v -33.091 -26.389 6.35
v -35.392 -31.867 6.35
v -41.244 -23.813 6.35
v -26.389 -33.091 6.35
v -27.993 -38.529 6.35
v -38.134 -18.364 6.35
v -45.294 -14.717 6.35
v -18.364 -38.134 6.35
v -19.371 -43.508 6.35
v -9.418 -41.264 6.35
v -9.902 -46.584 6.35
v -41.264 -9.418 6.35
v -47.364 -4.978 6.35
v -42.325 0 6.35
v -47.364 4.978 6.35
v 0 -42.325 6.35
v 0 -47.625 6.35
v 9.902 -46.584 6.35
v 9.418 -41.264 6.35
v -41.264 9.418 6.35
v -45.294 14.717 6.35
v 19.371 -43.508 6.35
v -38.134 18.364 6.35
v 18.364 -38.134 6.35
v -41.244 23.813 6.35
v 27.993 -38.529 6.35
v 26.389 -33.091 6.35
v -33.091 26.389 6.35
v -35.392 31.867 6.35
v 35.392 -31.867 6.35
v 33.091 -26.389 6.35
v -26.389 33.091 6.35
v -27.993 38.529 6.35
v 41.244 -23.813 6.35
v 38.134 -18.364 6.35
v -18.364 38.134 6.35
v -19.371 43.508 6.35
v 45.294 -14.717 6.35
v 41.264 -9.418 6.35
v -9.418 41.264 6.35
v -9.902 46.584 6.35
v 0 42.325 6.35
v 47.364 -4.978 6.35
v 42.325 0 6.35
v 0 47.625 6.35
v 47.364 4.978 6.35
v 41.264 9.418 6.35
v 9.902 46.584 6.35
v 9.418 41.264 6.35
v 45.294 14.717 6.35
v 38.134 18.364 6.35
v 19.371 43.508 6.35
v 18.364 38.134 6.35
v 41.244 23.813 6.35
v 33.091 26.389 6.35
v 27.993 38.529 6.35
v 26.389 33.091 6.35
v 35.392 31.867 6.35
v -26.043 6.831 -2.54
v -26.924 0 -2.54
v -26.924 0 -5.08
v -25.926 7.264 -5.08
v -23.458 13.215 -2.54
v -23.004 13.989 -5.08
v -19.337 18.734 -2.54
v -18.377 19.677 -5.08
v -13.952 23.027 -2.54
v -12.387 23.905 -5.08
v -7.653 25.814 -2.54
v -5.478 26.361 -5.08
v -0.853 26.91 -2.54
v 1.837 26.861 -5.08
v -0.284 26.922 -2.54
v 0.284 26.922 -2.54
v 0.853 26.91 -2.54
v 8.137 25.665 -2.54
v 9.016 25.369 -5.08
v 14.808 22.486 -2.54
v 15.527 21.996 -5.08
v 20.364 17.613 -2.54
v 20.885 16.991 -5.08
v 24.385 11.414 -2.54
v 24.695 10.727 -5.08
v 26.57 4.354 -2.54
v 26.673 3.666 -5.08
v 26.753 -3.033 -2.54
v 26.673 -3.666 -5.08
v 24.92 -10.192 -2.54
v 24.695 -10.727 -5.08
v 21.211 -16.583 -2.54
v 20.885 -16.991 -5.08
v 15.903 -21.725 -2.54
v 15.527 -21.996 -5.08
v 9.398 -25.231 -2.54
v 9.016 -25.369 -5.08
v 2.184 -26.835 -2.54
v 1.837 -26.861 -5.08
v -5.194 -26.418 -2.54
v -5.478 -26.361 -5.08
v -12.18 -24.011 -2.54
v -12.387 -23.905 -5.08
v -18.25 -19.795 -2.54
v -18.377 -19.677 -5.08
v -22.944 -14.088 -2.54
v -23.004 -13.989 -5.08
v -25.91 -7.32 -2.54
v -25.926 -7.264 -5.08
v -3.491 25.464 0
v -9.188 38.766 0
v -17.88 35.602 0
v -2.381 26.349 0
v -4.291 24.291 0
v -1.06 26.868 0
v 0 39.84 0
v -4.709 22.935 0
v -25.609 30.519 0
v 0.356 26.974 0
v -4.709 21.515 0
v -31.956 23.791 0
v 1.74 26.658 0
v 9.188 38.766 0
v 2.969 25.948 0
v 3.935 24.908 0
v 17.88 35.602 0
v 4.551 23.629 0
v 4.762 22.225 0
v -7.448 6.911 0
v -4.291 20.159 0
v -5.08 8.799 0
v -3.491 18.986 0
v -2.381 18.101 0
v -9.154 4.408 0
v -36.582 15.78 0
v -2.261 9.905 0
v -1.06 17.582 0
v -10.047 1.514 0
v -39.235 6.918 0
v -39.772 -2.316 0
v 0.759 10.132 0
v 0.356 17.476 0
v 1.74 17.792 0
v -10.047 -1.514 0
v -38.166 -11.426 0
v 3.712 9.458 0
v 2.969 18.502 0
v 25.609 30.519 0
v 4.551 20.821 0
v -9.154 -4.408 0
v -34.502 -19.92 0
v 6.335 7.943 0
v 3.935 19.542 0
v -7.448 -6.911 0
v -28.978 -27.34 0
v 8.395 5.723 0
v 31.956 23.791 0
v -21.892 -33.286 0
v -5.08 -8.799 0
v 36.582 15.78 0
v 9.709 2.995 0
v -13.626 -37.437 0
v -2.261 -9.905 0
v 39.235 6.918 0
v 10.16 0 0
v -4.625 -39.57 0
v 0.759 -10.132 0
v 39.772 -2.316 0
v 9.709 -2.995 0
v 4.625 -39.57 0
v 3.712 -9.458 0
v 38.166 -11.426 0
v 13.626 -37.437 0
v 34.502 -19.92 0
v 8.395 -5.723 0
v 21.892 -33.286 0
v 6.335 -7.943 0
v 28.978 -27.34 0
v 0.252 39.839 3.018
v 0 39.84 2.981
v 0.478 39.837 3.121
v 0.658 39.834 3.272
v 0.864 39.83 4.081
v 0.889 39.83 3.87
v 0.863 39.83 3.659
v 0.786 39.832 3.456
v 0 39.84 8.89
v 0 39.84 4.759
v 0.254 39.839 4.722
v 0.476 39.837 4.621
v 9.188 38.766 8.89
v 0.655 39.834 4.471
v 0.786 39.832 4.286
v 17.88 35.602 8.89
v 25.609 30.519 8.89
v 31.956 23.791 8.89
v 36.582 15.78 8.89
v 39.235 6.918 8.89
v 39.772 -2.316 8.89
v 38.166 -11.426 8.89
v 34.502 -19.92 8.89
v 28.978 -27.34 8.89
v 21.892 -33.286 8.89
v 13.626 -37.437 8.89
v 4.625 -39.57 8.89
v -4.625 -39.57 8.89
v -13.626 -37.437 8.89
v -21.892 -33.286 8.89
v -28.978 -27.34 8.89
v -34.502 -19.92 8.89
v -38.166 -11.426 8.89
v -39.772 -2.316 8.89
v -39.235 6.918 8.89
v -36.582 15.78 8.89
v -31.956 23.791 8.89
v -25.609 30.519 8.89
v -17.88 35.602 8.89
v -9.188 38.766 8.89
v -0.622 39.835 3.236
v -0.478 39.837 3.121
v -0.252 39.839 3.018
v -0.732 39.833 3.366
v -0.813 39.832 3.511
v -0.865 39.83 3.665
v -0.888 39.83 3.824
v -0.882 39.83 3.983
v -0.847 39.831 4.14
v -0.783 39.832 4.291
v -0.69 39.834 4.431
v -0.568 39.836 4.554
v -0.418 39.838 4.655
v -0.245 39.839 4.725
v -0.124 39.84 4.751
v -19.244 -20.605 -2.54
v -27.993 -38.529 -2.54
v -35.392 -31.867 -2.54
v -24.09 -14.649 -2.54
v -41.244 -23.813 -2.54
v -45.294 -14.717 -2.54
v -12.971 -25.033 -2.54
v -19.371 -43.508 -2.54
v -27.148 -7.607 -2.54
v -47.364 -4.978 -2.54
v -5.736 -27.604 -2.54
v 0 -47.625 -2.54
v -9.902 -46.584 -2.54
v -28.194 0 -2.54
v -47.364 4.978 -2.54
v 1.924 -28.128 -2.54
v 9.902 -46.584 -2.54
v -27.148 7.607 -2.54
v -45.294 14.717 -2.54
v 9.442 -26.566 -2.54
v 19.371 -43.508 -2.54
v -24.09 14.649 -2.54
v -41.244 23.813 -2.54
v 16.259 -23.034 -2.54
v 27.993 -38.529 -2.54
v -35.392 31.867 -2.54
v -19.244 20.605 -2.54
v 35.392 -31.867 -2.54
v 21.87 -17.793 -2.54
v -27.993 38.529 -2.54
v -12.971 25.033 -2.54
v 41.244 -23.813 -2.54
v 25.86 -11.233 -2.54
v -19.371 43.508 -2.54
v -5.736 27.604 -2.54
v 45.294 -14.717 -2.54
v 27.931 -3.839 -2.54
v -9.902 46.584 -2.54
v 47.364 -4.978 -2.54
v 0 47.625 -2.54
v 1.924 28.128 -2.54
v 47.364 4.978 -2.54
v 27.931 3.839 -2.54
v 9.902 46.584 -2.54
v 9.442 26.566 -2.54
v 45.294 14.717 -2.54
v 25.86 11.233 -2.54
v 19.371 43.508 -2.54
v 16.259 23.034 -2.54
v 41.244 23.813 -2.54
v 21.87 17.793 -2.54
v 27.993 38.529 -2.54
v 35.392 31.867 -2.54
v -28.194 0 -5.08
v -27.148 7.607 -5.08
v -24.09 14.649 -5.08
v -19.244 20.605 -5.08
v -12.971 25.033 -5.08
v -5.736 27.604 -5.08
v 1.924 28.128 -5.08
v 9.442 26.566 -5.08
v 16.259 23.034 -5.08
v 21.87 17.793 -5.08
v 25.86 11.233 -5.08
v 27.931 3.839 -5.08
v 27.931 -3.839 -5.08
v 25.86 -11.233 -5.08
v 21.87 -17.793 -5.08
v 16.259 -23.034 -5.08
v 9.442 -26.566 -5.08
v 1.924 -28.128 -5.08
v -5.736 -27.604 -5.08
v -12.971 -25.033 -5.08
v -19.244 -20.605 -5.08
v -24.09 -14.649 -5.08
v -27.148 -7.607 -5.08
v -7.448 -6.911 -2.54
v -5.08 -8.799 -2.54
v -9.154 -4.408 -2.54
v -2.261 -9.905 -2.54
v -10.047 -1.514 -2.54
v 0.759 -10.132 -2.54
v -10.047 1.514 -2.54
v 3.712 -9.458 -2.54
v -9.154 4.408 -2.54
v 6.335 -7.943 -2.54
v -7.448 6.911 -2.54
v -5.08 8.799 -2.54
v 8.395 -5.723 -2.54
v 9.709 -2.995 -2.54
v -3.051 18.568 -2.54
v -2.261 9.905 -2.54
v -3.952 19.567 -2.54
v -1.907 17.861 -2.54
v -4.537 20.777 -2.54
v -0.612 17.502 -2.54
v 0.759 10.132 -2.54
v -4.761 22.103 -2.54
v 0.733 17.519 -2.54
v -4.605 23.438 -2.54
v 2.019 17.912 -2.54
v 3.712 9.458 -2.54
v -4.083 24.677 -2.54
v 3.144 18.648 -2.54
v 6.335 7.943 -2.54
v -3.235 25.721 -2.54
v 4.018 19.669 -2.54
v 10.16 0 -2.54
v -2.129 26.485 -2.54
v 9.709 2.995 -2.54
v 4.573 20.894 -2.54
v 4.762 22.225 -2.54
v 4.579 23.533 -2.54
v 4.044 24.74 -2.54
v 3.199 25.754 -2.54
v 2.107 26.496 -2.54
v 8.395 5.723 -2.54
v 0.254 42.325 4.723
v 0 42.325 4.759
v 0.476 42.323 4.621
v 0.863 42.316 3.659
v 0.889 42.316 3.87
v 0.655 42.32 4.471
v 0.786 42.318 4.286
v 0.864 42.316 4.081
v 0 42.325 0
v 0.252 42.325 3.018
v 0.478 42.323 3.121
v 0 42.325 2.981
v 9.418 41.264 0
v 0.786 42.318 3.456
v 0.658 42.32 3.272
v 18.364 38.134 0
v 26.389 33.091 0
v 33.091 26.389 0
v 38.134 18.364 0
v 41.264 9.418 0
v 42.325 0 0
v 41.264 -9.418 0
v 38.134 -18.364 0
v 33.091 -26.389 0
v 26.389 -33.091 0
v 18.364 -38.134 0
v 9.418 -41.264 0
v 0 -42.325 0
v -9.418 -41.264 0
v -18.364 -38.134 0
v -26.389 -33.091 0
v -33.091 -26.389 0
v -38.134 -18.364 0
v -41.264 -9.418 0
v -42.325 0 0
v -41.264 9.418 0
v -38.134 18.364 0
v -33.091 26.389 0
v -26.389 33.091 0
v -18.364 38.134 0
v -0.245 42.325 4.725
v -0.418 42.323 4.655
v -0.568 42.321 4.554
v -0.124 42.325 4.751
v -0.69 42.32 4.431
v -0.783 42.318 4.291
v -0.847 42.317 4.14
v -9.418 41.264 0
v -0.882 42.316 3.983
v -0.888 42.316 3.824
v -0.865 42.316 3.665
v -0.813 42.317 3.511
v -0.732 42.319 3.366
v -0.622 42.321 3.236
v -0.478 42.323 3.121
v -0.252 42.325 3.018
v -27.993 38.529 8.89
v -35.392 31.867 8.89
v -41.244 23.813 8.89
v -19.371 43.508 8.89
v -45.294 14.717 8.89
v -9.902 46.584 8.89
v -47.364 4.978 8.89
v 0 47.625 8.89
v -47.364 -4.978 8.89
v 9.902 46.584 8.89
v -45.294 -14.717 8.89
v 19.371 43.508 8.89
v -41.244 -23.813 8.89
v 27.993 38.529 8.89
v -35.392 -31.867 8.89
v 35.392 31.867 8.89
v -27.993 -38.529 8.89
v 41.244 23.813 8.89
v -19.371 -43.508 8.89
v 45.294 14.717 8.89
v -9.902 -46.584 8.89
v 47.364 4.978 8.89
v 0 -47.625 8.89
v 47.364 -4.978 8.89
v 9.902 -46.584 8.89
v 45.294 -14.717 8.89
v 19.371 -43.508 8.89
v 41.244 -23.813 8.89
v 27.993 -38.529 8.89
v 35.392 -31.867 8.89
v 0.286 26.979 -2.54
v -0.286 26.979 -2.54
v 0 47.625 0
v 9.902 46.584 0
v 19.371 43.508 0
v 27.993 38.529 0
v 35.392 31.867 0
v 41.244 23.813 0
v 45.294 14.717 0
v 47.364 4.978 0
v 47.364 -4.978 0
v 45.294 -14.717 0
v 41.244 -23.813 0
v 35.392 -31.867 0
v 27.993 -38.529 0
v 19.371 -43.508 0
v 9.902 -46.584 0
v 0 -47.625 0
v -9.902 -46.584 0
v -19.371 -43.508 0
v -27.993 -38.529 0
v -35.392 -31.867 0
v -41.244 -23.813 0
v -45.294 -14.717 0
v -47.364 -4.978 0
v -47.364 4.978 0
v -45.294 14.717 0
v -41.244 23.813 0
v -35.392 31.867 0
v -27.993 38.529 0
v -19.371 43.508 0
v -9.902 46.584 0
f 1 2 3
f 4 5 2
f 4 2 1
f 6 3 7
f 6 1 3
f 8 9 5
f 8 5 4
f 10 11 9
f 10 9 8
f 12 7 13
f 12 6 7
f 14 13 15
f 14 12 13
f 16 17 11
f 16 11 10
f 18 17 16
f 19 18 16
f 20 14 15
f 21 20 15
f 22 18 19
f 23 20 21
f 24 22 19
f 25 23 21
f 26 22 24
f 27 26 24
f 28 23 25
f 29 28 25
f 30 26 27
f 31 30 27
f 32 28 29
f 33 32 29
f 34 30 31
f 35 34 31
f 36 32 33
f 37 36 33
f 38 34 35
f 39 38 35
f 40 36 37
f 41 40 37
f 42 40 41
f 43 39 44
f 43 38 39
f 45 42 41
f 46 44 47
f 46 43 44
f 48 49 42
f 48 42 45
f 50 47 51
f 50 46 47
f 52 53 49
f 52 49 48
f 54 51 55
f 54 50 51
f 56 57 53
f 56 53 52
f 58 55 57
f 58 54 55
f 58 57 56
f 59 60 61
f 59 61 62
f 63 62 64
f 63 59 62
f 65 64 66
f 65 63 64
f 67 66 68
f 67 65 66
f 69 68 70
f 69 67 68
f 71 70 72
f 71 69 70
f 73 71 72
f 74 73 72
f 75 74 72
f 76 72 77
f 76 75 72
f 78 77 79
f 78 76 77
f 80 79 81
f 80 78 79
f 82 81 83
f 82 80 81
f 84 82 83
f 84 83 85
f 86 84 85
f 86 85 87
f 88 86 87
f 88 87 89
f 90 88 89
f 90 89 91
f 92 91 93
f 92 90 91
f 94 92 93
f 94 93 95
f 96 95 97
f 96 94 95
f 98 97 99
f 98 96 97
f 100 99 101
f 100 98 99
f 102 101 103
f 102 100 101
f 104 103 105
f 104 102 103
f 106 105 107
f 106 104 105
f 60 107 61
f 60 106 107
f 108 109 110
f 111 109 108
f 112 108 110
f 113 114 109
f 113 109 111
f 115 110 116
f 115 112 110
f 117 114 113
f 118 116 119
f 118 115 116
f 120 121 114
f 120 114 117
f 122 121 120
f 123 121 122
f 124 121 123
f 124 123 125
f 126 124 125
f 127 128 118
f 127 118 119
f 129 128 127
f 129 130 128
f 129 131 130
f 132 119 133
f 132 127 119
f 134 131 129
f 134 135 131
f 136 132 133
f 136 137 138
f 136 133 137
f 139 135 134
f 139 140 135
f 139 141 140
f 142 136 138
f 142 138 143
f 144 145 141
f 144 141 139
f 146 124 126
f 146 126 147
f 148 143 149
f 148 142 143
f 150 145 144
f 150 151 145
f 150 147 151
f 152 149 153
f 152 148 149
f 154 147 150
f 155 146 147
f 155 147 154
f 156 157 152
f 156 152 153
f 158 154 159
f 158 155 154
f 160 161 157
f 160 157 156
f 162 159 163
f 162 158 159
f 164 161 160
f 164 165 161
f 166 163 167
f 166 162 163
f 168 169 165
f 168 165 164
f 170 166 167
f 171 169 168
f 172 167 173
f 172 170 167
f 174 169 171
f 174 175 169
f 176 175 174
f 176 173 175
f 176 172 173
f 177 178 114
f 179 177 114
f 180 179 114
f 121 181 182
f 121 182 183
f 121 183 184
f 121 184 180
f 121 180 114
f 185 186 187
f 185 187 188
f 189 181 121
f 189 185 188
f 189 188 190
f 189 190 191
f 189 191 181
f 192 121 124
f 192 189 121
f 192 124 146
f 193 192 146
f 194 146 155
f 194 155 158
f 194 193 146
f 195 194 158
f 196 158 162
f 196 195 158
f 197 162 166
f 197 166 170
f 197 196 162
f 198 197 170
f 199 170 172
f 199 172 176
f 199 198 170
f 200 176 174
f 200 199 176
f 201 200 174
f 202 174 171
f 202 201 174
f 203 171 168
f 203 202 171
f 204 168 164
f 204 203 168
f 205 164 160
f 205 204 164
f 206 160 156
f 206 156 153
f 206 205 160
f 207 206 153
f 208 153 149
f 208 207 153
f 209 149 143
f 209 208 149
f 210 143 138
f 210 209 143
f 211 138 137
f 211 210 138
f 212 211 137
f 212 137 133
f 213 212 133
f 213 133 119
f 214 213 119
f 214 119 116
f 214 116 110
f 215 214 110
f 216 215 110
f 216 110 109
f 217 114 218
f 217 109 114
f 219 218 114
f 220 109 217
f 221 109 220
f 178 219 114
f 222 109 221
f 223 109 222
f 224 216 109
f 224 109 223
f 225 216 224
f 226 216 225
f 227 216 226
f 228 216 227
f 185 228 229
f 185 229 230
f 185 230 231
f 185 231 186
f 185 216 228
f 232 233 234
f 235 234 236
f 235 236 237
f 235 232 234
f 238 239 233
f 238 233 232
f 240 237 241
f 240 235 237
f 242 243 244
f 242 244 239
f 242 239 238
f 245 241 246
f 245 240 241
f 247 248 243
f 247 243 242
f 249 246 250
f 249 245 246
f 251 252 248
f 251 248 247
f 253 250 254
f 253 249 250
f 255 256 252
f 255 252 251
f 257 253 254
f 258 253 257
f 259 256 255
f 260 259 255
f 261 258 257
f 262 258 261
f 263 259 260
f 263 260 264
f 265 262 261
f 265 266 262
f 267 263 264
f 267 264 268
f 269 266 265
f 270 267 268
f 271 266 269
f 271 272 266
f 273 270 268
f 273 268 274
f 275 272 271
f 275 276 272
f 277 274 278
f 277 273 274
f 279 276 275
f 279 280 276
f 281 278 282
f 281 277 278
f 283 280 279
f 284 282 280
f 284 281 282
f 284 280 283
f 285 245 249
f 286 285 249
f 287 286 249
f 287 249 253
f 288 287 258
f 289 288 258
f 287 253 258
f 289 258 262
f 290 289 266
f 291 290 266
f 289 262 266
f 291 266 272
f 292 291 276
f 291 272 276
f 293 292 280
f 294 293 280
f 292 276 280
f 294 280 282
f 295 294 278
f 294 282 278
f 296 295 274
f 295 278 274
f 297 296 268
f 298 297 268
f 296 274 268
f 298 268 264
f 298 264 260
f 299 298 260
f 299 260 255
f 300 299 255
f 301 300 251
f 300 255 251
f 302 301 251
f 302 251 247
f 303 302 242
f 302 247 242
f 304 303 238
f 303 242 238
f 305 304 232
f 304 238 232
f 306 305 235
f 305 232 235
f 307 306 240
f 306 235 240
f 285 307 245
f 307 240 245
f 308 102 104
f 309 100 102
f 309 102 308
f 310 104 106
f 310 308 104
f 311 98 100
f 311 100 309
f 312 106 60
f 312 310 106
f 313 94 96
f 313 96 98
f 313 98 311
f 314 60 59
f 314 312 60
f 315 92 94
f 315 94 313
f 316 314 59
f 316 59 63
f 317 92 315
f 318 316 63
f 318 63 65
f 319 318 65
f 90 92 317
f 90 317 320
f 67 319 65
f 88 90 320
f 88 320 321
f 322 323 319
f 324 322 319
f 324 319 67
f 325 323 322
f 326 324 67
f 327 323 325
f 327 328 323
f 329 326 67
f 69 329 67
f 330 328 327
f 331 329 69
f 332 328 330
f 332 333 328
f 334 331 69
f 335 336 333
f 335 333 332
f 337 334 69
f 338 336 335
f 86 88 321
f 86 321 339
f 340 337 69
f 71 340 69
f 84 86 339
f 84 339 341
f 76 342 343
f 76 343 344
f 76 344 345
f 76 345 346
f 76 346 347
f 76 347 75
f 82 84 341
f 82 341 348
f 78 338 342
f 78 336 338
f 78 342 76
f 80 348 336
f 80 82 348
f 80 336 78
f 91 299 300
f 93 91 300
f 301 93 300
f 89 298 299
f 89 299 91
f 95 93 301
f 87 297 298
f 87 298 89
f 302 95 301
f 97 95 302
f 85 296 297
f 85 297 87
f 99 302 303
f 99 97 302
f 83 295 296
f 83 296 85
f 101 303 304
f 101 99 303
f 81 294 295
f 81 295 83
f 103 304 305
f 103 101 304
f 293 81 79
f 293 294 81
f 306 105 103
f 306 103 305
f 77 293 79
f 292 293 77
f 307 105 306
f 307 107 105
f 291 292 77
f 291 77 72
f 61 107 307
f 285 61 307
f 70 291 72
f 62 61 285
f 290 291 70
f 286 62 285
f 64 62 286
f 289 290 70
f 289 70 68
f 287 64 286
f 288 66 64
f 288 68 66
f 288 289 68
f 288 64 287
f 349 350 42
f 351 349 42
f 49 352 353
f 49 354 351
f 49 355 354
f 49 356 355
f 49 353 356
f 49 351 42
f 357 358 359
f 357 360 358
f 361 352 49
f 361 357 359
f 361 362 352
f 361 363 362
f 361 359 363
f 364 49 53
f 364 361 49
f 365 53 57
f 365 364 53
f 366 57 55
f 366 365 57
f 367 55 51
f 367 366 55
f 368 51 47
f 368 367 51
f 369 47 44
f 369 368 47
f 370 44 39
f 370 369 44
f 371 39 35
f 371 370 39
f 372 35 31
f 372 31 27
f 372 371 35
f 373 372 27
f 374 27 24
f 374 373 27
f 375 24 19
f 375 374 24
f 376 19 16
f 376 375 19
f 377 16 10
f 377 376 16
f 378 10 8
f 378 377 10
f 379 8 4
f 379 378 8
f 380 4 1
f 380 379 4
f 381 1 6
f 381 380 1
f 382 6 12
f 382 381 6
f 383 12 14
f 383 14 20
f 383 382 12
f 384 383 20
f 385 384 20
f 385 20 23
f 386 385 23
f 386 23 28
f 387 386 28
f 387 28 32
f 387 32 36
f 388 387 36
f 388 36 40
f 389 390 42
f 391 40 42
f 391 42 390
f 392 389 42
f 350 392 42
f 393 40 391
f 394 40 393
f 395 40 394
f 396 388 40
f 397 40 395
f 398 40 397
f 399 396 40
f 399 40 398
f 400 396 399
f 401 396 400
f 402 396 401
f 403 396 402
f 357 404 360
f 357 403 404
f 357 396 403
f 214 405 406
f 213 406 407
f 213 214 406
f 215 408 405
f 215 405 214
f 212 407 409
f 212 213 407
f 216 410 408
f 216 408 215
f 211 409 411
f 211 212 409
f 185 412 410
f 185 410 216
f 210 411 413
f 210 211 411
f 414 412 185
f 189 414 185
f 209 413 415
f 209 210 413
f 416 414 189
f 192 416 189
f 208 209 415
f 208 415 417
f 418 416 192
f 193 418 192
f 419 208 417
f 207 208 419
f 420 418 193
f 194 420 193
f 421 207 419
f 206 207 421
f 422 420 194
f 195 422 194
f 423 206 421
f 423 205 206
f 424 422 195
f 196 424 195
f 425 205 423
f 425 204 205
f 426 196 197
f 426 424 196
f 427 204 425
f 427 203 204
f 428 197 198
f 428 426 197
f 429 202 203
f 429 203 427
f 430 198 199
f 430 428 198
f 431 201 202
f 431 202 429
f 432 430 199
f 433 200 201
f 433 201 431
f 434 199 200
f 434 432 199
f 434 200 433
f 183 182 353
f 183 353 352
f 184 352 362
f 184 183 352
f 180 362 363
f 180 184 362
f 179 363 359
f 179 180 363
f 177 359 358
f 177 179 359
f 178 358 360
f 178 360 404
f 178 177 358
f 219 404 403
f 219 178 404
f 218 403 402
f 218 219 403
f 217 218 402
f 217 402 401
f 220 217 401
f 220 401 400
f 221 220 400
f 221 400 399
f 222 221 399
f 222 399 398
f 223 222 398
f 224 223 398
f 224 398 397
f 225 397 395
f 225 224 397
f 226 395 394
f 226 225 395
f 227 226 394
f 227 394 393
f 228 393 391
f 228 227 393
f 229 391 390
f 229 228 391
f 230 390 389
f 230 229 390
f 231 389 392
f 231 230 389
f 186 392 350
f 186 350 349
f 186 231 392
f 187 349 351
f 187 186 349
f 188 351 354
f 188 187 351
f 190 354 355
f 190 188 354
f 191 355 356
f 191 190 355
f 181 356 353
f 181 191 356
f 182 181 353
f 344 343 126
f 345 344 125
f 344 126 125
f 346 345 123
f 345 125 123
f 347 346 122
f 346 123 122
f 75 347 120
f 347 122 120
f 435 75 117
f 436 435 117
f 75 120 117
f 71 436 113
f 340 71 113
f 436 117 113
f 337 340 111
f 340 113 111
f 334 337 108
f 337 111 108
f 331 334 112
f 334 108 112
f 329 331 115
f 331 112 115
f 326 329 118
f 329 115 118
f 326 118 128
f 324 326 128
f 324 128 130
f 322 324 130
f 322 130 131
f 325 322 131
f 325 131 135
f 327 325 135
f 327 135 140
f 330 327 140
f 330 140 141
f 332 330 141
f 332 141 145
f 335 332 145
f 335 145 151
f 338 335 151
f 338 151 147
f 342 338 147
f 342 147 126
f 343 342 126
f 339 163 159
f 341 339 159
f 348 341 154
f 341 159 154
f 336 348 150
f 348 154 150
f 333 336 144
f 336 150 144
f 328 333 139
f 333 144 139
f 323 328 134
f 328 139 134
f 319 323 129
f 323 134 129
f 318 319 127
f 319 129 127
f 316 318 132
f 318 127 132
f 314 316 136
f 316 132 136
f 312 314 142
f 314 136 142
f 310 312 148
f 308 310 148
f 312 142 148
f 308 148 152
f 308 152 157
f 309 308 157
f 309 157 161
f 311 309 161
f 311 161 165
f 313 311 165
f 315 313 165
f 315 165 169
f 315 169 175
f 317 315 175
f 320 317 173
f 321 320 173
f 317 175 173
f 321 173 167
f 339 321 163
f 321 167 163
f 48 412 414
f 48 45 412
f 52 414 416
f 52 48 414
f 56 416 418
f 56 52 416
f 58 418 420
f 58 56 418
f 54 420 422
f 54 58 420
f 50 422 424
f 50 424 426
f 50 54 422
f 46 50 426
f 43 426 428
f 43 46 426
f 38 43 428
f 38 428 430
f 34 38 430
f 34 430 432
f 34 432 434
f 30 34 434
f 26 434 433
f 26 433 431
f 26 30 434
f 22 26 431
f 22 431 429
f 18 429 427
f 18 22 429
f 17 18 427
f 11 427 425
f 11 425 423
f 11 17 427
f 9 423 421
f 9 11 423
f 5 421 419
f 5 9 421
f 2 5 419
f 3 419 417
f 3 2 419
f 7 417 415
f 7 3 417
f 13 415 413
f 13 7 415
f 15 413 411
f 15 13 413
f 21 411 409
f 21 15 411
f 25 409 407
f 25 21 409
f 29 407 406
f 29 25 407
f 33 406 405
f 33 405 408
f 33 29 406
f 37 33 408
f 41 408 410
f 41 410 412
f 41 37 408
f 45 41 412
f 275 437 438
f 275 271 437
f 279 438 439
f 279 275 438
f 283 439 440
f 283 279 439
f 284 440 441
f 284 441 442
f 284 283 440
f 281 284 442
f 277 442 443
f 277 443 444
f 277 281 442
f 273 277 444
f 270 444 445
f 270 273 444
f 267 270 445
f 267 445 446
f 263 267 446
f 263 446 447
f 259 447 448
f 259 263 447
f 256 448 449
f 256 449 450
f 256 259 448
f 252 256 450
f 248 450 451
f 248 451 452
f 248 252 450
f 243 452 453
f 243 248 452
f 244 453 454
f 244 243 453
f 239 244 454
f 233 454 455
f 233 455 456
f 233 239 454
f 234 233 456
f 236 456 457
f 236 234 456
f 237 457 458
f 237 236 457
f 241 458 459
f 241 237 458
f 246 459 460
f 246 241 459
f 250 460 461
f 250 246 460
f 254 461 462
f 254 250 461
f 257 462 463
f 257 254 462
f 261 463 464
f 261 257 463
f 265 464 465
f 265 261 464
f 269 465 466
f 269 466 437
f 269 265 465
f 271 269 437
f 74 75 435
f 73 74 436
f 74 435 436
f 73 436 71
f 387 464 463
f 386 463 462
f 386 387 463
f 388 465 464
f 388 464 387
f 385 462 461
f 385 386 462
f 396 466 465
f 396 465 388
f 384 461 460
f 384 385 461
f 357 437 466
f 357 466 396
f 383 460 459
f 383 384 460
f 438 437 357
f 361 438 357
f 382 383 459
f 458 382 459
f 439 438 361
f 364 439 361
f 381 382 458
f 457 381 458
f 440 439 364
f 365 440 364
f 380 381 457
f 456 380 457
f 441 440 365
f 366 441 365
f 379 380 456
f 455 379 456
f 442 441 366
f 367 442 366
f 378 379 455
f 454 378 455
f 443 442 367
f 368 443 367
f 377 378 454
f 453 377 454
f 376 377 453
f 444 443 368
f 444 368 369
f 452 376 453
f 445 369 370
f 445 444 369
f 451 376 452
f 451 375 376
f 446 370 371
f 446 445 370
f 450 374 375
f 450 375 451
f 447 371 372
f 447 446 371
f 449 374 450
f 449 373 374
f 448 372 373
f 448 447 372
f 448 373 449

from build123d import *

# Parameters (mm, degrees)
SKETCH3_R           = 10.16
CUT_EXTRUDE1_DEPTH  = 2.54
SKETCH5_R           = 4.7625
CUT_EXTRUDE2_DEPTH  = 6.35
SKETCH11_R          = 0.889
CUT_EXTRUDE6_DEPTH  = 55.372
SKETCH12_R          = 28.194
SKETCH12_R_2        = 26.924
BOSS_EXTRUDE1_DEPTH = 2.54


with BuildPart() as part:
    # Sketch2 → Revolve1 (revolve)
    with BuildSketch(Plane(origin=(0, 0, 0), x_dir=(0, 0, -1), z_dir=(1, 0, 0))):
        Polygon((-6.35, 42.32529), (0, 42.32529), (0, 47.625), (2.54, 47.625), (2.54, 0), (0, 0), (0, 39.839805153), (-8.89, 39.839805153), (-8.89, 47.625), (-6.35, 47.625), align=None)
    revolve(axis=Axis((0, 0, 0), (0, 0, -1)))

    # Sketch3 → Cut-Extrude1 (cut)
    with BuildSketch(Plane.XY):
        Circle(SKETCH3_R)
    extrude(amount=-CUT_EXTRUDE1_DEPTH, mode=Mode.SUBTRACT)

    # Sketch5 → Cut-Extrude2 (cut)
    with BuildSketch(Plane.XY):
        with Locations((0, 22.225)):
            Circle(SKETCH5_R)
    extrude(amount=-CUT_EXTRUDE2_DEPTH, mode=Mode.SUBTRACT)

    # Sketch11 → Cut-Extrude6 (cut)
    with BuildSketch(Plane(origin=(0, 0, 0), x_dir=(1, 0, 0), z_dir=(0, 1, 0))):
        with Locations((0, -3.870418615)):
            Circle(SKETCH11_R)
    extrude(amount=CUT_EXTRUDE6_DEPTH, mode=Mode.SUBTRACT)

    # Sketch12 → Boss-Extrude1 (add)
    with BuildSketch(Plane(origin=(0, 0, -2.54), x_dir=(-1, 0, 0), z_dir=(0, 0, -1))):
        Circle(SKETCH12_R)
        Circle(SKETCH12_R_2, mode=Mode.SUBTRACT)
    extrude(amount=BOSS_EXTRUDE1_DEPTH)


solid = part.part
